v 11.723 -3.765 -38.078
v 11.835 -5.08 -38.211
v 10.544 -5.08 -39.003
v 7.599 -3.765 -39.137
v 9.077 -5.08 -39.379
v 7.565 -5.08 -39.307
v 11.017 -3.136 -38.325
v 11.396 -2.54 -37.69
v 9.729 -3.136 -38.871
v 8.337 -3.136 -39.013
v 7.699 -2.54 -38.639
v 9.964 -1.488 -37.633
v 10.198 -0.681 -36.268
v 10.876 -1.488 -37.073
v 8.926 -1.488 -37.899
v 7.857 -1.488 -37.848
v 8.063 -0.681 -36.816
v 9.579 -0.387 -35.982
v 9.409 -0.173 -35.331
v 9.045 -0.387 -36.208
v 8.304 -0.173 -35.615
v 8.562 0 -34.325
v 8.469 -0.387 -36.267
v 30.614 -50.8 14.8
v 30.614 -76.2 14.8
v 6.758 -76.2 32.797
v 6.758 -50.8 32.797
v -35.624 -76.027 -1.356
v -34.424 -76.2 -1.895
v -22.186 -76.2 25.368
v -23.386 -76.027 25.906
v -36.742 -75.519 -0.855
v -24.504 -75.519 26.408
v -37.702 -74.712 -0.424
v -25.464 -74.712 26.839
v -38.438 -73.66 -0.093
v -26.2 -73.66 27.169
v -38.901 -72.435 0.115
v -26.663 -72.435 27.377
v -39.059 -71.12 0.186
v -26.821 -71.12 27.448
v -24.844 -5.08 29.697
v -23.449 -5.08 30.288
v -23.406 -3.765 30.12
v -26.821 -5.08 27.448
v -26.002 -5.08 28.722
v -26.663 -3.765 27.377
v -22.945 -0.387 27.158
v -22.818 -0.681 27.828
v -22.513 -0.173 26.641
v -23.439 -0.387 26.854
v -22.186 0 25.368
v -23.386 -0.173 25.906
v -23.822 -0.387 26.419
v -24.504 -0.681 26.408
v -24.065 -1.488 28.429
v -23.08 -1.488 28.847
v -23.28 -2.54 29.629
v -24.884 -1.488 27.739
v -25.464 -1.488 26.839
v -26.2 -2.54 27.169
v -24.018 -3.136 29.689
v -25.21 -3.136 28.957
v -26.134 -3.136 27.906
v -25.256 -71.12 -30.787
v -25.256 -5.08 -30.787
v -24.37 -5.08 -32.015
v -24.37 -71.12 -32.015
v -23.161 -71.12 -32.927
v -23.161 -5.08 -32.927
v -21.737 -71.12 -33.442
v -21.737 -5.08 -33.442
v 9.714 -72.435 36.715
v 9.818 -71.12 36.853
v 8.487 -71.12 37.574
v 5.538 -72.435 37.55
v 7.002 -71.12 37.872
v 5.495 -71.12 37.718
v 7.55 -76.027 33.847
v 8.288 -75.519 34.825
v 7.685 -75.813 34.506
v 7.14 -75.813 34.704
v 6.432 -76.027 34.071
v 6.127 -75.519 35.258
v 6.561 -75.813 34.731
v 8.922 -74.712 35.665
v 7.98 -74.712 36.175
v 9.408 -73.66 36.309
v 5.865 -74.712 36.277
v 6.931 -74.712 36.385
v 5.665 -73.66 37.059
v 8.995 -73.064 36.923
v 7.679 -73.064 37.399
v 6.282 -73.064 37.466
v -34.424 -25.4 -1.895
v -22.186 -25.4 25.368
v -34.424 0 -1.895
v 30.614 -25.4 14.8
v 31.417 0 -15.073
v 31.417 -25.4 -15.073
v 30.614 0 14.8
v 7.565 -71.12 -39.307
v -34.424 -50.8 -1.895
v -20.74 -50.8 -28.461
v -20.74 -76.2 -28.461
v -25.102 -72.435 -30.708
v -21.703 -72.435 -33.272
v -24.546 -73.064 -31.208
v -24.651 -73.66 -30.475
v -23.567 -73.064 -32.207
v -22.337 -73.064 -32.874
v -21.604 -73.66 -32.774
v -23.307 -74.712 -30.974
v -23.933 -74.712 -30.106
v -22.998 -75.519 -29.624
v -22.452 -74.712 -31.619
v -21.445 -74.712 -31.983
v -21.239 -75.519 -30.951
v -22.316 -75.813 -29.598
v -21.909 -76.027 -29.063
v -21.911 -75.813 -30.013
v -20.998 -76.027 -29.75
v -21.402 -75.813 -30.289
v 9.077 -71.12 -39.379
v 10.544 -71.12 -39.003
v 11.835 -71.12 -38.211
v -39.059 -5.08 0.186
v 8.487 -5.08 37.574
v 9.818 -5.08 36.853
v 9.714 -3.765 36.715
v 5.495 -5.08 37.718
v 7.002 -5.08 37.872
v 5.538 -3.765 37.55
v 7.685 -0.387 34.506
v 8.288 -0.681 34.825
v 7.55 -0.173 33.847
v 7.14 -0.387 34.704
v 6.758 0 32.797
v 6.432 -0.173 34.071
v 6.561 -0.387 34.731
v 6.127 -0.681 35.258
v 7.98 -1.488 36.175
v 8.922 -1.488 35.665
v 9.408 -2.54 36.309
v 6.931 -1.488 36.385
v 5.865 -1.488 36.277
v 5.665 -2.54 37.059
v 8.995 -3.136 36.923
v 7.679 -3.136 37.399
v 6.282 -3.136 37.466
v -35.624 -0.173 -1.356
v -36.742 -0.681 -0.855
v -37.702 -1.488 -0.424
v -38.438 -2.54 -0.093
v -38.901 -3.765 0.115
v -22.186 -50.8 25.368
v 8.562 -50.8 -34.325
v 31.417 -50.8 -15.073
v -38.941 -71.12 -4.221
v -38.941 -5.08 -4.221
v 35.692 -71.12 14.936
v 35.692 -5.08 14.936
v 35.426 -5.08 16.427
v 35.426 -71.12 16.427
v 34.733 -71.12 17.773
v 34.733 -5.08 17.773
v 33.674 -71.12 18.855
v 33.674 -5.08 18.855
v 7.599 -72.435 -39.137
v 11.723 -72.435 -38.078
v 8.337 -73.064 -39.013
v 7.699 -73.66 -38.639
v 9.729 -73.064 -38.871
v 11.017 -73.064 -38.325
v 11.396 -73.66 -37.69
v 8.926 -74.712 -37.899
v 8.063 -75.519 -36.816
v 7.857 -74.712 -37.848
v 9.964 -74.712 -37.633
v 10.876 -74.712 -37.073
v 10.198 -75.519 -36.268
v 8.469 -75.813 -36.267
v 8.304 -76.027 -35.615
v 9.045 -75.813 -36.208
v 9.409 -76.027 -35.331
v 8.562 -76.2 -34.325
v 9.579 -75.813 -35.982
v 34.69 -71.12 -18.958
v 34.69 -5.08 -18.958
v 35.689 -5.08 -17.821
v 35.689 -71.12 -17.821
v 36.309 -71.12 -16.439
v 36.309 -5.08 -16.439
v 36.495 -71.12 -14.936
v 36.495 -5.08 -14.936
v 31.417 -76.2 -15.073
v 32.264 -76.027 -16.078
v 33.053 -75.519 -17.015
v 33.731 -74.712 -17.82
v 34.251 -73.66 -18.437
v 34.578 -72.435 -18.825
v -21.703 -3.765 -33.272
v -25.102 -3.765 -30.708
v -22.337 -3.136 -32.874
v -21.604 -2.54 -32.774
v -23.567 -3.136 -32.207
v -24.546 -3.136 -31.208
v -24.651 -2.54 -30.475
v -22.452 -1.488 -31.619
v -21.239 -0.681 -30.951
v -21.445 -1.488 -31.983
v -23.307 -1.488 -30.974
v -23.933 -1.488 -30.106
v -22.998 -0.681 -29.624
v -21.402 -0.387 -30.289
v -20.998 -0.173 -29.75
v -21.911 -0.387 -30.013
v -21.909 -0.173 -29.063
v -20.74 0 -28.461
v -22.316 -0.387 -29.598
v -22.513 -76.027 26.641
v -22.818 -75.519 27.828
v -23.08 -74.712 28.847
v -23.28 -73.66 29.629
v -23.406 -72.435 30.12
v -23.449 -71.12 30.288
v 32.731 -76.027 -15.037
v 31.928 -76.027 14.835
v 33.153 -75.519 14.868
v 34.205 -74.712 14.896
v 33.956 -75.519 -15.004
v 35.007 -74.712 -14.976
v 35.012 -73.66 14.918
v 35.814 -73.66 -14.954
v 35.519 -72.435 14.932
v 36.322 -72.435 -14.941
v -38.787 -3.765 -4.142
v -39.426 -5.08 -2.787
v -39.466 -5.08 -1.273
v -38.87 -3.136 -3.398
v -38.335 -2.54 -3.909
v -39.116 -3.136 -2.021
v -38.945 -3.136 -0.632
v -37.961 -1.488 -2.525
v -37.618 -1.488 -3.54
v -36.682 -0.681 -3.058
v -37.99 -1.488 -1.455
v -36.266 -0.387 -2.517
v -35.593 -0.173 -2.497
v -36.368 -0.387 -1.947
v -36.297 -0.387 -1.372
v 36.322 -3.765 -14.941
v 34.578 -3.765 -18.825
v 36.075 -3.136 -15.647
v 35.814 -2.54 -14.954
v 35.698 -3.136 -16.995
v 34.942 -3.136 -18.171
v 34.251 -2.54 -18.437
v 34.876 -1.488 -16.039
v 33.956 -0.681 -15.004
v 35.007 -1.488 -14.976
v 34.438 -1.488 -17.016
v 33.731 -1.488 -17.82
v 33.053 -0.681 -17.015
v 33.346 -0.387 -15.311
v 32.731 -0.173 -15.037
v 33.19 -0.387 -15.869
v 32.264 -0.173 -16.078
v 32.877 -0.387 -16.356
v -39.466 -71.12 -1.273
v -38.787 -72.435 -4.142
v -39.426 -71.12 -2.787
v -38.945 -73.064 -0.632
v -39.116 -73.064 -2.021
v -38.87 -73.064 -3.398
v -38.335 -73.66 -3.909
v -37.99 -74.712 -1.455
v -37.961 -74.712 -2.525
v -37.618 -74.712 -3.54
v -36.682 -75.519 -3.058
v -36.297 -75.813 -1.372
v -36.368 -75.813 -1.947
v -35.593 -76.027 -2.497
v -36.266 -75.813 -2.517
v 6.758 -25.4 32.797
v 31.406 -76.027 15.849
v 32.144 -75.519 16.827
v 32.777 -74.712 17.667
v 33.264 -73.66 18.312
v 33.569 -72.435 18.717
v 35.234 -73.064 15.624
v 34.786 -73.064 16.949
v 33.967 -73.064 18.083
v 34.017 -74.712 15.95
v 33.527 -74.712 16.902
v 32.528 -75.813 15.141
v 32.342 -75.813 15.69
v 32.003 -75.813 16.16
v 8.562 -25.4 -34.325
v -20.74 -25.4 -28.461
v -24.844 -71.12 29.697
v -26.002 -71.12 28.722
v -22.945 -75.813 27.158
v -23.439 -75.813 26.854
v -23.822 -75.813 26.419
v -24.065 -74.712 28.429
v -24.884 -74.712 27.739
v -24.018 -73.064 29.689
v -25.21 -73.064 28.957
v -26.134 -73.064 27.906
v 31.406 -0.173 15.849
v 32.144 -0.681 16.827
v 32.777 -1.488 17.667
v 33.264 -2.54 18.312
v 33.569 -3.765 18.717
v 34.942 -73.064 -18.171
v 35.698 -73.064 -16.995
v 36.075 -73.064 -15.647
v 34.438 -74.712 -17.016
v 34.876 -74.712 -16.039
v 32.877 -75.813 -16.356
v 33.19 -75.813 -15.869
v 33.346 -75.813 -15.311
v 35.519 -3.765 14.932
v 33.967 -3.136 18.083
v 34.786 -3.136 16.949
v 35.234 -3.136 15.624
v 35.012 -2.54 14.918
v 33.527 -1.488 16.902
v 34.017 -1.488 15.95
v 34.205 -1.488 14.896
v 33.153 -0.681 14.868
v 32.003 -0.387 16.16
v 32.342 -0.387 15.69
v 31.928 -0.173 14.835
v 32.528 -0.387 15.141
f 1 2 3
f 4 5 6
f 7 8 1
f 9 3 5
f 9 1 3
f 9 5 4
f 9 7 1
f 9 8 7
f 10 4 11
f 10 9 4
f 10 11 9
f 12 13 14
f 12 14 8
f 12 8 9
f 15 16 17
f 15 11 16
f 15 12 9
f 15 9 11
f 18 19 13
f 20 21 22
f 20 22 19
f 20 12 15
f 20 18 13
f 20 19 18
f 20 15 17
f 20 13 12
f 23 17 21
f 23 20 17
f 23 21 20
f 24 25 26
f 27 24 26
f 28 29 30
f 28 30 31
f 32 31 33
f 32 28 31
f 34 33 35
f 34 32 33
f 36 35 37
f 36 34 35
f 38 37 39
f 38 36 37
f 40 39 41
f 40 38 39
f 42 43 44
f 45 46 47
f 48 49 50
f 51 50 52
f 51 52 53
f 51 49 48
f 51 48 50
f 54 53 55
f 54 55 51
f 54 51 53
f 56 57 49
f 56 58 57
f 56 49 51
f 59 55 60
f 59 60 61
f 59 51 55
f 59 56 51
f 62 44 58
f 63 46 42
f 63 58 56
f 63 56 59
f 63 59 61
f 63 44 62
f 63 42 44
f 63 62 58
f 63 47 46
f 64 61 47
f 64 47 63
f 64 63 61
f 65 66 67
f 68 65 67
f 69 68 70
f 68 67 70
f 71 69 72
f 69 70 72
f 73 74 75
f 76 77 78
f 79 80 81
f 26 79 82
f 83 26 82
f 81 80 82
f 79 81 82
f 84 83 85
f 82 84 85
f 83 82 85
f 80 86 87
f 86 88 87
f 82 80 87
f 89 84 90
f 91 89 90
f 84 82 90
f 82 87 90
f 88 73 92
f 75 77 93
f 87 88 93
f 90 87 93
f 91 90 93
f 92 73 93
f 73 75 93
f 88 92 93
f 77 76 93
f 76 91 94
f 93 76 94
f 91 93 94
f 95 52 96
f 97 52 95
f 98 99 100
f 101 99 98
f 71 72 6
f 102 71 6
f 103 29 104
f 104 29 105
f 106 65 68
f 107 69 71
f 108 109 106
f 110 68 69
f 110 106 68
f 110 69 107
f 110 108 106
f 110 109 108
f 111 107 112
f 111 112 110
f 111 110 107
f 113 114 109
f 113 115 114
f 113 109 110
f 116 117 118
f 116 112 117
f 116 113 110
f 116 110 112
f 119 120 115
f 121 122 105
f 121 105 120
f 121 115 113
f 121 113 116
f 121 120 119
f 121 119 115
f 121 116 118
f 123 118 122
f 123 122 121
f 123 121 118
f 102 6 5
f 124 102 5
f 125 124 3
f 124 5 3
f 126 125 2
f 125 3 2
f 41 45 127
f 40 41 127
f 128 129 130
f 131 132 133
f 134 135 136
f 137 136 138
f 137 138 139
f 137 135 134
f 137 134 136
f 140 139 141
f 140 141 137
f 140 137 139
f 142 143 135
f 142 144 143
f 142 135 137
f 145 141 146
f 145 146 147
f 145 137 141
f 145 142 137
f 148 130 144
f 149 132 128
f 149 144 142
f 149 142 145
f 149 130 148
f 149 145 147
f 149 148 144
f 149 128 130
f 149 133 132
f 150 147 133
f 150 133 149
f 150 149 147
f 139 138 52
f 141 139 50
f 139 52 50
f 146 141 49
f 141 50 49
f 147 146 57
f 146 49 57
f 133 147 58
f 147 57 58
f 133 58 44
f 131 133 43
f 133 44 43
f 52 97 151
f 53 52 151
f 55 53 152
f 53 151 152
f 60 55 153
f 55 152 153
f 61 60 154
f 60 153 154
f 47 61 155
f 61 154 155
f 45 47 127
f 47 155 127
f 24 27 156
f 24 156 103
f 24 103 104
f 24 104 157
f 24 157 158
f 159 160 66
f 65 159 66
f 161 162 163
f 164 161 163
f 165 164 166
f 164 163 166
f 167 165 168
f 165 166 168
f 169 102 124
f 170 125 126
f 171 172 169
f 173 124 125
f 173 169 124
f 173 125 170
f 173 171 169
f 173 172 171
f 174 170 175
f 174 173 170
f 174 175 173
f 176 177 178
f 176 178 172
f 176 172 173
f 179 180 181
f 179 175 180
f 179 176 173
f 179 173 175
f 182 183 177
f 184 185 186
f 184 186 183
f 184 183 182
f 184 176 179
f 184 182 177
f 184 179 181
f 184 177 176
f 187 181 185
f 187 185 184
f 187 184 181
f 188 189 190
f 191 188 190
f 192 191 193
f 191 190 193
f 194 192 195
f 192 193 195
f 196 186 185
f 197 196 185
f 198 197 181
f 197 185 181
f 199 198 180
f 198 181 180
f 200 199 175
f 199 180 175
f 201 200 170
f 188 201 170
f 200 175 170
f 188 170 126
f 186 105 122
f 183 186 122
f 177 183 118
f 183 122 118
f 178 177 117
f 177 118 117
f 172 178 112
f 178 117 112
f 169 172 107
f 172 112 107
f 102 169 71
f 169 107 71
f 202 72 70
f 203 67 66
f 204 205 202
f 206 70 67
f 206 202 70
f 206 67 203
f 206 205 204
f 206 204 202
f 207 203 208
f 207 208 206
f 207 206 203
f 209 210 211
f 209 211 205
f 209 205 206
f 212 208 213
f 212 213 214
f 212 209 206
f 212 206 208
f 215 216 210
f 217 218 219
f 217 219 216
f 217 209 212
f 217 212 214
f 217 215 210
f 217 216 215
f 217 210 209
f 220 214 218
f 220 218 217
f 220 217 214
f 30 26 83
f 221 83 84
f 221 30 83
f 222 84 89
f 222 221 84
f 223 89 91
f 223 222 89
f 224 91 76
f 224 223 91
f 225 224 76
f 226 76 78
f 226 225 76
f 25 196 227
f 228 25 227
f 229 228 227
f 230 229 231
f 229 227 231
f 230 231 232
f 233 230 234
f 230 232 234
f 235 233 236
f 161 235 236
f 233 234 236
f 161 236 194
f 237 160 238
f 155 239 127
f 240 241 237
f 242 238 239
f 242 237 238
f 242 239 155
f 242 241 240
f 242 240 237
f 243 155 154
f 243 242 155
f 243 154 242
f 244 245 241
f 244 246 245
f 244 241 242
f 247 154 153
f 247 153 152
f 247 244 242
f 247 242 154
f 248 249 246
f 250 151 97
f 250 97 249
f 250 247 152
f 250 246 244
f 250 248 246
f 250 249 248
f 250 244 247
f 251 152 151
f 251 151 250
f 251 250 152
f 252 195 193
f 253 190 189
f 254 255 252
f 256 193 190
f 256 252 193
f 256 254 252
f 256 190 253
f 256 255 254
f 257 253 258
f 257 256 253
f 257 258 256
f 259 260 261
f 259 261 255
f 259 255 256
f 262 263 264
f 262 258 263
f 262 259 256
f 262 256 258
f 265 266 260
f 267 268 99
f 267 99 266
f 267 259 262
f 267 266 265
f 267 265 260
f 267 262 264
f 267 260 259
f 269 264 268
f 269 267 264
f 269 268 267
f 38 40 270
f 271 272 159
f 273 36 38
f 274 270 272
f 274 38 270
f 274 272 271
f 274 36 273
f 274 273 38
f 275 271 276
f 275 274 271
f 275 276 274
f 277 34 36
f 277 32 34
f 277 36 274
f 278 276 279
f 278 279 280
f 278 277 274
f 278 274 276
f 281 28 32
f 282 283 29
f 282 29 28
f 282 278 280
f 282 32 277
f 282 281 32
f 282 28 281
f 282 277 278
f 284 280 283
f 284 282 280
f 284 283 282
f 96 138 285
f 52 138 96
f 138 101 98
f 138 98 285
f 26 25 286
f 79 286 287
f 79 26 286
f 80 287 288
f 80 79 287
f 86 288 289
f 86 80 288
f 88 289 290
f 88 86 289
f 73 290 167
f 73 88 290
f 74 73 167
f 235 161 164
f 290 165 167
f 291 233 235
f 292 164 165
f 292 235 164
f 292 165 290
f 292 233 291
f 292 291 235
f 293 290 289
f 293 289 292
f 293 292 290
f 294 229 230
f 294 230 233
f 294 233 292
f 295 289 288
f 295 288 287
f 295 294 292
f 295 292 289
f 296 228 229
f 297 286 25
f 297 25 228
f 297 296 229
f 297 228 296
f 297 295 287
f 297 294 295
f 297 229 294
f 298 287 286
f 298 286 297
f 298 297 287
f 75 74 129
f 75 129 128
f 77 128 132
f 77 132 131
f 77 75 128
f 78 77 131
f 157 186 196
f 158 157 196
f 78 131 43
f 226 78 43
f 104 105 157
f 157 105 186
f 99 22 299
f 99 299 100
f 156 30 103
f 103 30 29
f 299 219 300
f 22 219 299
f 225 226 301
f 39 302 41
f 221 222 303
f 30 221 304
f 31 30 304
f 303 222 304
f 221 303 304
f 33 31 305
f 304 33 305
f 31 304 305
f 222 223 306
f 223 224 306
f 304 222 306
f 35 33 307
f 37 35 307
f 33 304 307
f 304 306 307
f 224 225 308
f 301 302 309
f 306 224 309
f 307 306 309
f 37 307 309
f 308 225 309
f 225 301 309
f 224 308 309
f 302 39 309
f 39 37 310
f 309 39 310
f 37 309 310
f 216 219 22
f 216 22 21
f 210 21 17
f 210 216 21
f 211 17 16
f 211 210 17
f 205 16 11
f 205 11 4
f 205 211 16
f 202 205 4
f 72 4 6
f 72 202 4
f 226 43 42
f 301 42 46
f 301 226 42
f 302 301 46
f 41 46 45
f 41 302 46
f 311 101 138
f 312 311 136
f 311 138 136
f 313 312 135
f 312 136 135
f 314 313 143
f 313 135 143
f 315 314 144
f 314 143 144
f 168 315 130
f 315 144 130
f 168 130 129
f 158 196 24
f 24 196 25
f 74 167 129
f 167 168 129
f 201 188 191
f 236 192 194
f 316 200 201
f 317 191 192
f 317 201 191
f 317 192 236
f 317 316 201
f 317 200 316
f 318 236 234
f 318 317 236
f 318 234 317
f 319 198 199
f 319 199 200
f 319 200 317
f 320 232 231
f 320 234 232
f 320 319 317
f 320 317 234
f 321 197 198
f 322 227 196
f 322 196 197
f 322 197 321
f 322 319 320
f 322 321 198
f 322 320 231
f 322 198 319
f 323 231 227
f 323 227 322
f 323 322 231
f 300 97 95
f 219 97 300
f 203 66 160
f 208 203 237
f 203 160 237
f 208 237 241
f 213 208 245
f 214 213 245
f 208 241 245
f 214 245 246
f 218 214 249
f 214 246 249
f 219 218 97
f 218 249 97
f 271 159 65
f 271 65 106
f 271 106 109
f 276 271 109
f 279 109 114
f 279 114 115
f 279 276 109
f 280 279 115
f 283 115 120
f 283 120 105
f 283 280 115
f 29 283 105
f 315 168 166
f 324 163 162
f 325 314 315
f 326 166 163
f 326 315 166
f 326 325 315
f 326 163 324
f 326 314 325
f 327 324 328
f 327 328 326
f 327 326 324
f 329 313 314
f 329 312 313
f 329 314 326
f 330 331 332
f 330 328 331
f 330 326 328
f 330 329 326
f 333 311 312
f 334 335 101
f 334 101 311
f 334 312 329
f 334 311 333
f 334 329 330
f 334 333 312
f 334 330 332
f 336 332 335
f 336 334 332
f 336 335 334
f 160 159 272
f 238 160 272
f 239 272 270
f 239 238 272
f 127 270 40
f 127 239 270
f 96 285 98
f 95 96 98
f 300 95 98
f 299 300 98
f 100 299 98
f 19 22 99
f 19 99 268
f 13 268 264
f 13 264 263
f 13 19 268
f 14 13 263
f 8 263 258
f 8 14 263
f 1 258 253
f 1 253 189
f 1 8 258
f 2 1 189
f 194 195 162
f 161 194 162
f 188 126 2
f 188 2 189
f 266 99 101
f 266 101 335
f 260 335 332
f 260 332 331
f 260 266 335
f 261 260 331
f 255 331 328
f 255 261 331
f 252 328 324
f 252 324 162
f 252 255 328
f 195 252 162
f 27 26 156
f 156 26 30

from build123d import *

# Parameters (mm, degrees)
F1_DEPTH     = 76.2
F2_F1_R      = 5.08
F2_F2_R      = 5.08
F2_F3_R      = 5.08
F2_F4_R      = 5.08
F3_T1_DEPTH  = 66.04
F3_T3_DEPTH  = 29.883199232
F3_T5_DEPTH  = 29.883199232
F3_T7_DEPTH  = 29.883199232
F3_T9_DEPTH  = 29.883199232
F3_T14_DEPTH = 5.08
F3_T20_DEPTH = 5.08
F3_T26_DEPTH = 5.08
F3_T32_DEPTH = 5.08
F3_T38_DEPTH = 5.08
F3_T44_DEPTH = 5.08
F3_T50_DEPTH = 5.08
F3_T56_DEPTH = 5.08
F3_T62_DEPTH = 5.08
F3_T68_DEPTH = 5.08
F5_DEPTH     = 25.4
F6_DEPTH     = 25.4


# Not quite as in the source:
# - a fillet or chamfer that OpenCascade refuses, or shapes differently, is made with other operations: its cross-section is extruded or revolved along the edge and cut away or added
# - a feature of the source that left no trace in its solid (it failed there, or was rolled back) is left out


with BuildPart() as f1:
    # F0 (on Front) → F1 (new body)
    with BuildSketch(Plane.XZ):
        Polygon((36.5605491077, -17.381725656), (35.6265013603, 17.381725656), (7.8649714404, 38.3261150914), (-25.8190423903, 29.6798902177), (-40.0607906887, -2.0461652844), (-24.1359465072, -32.9616845282), (9.9637576777, -39.7866509615), align=None)
    extrude(amount=F1_DEPTH)

    # F2: fillet of radius 5.08 on 4 edges, made by hand

    # F2_f1
    f2_f1_edges = [f1.edges().sort_by_distance(p)[0] for p in [
        (7.8649714404, -38.1, 38.3261150914),
    ]]
    fillet(f2_f1_edges, radius=F2_F1_R)

    # F2_f2
    f2_f2_edges = [f1.edges().sort_by_distance(p)[0] for p in [
        (-25.8190423903, -38.1, 29.6798902177),
    ]]
    fillet(f2_f2_edges, radius=F2_F2_R)

    # F2_f3
    f2_f3_edges = [f1.edges().sort_by_distance(p)[0] for p in [
        (-8.9770354749, 0, 34.0030026545),
    ]]
    fillet(f2_f3_edges, radius=F2_F3_R)

    # F2_f4
    f2_f4_edges = [f1.edges().sort_by_distance(p)[0] for p in [
        (-8.9770354749, -76.2, 34.0030026545),
    ]]
    fillet(f2_f4_edges, radius=F2_F4_R)

    # F3: fillet of radius 5.08 on 19 edges, made by hand

    # F3_s2 → F3_t1 (cut)
    with BuildSketch(Plane.XZ.offset(5.08)):
        with BuildLine():
            ThreePointArc((35.6922091389, 14.9362091735), (35.1301118192, 17.1260312252), (33.6735514536, 18.8551078331))
            Line((33.6735514536, 18.8551078331), (35.6265013603, 17.381725656))
            Line((35.6265013603, 17.381725656), (35.6922091389, 14.9362091735))
        make_face()
        with BuildLine():
            ThreePointArc((34.6895354607, -18.957852653), (36.0511453352, -17.1530555552), (36.4948413291, -14.9362091735))
            Line((36.4948413291, -14.9362091735), (36.5605491077, -17.381725656))
            Line((36.5605491077, -17.381725656), (34.6895354607, -18.957852653))
        make_face()
        with BuildLine():
            ThreePointArc((7.564934043, -39.3065326972), (9.8249311044, -39.245809579), (11.8347713247, -38.2105239645))
            Line((11.8347713247, -38.2105239645), (9.9637576777, -39.7866509615))
            Line((9.9637576777, -39.7866509615), (7.564934043, -39.3065326972))
        make_face()
        with BuildLine():
            ThreePointArc((-25.2562170056, -30.7868598483), (-23.79965664, -32.5159364562), (-21.7371228725, -33.4418027925))
            Line((-21.7371228725, -33.4418027925), (-24.1359465072, -32.9616845282))
            Line((-24.1359465072, -32.9616845282), (-25.2562170056, -30.7868598483))
        make_face()
        with BuildLine():
            ThreePointArc((-38.9405201903, -4.2209899644), (-39.50261751, -2.0311679128), (-39.0589215161, 0.1856784689))
            Line((-39.0589215161, 0.1856784689), (-40.0607906887, -2.0461652844))
            Line((-40.0607906887, -2.0461652844), (-38.9405201903, -4.2209899644))
        make_face()
    extrude(amount=F3_T1_DEPTH, mode=Mode.SUBTRACT)

    # F3_s4 → F3_t3 (cut)
    with BuildSketch(Plane(origin=(0.4273541338, 0, -15.9052946325), x_dir=(0, 1, 0), z_dir=(-0.026858978, 0, 0.9996392326))):
        with BuildLine():
            ThreePointArc((-76.2, -31.0005038658), (-74.7121024484, -34.5926063143), (-71.12, -36.0805038658))
            Line((-71.12, -36.0805038658), (-76.2, -36.0805038658))
            Line((-76.2, -36.0805038658), (-76.2, -31.0005038658))
        make_face()
        with BuildLine():
            ThreePointArc((0, -31.0005038658), (-1.4878975516, -34.5926063143), (-5.08, -36.0805038658))
            Line((-5.08, -36.0805038658), (0, -36.0805038658))
            Line((0, -36.0805038658), (0, -31.0005038658))
        make_face()
    extrude(amount=F3_T3_DEPTH, mode=Mode.SUBTRACT)

    # F3_s6 → F3_t5 (cut)
    with BuildSketch(Plane(origin=(-11.9052292748, 0, -10.0288703376), x_dir=(0, 1, 0), z_dir=(0.7648031243, 0, 0.6442640616))):
        with BuildLine():
            ThreePointArc((0, -31.7682459503), (-1.4878975516, -35.3603483987), (-5.08, -36.8482459503))
            Line((-5.08, -36.8482459503), (0, -36.8482459503))
            Line((0, -36.8482459503), (0, -31.7682459503))
        make_face()
        with BuildLine():
            ThreePointArc((-76.2, -31.7682459503), (-74.7121024484, -35.3603483987), (-71.12, -36.8482459503))
            Line((-71.12, -36.8482459503), (-76.2, -36.8482459503))
            Line((-76.2, -36.8482459503), (-76.2, -31.7682459503))
        make_face()
    extrude(amount=F3_T5_DEPTH, mode=Mode.SUBTRACT)

    # F3_s8 → F3_t7 (cut)
    with BuildSketch(Plane(origin=(-14.4644044829, 0, 2.8950126528), x_dir=(0, 1, 0), z_dir=(0.9805528748, 0, -0.1962550883))):
        with BuildLine():
            ThreePointArc((0, -31.9774768364), (-1.4878975516, -35.5695792849), (-5.08, -37.0574768364))
            Line((-5.08, -37.0574768364), (0, -37.0574768364))
            Line((0, -37.0574768364), (0, -31.9774768364))
        make_face()
        with BuildLine():
            ThreePointArc((-76.2, -31.9774768364), (-74.7121024484, -35.5695792849), (-71.12, -37.0574768364))
            Line((-71.12, -37.0574768364), (-76.2, -37.0574768364))
            Line((-76.2, -37.0574768364), (-76.2, -31.9774768364))
        make_face()
    extrude(amount=F3_T7_DEPTH, mode=Mode.SUBTRACT)

    # F3_s10 → F3_t9 (cut)
    with BuildSketch(Plane(origin=(-6.4473598679, 0, 12.5165104158), x_dir=(0, 1, 0), z_dir=(0.457926311, 0, -0.8889901539))):
        with BuildLine():
            ThreePointArc((-71.12, -36.5506413995), (-74.7121024484, -35.0627438479), (-76.2, -31.4706413995))
            Line((-76.2, -31.4706413995), (-76.2, -36.5506413995))
            Line((-76.2, -36.5506413995), (-71.12, -36.5506413995))
        make_face()
        with BuildLine():
            ThreePointArc((-5.08, -36.5506413995), (-1.4878975516, -35.0627438479), (0, -31.4706413995))
            Line((0, -31.4706413995), (0, -36.5506413995))
            Line((0, -36.5506413995), (-5.08, -36.5506413995))
        make_face()
    extrude(amount=F3_T9_DEPTH, mode=Mode.SUBTRACT)


with BuildPart() as f3_tool12:
    # F3_s13 → F3_t14 (new body)
    with BuildSketch(Plane.XZ.offset(71.12)):
        Polygon((30.6140418374, 14.7997655654), (35.6922091389, 14.9362091735), (35.6265013603, 17.381725656), (33.6735514536, 18.8551078331), align=None)
    extrude(amount=F3_T14_DEPTH)

    # F3_s15 → F3_t16 (revolve, cut)
    with BuildSketch(Plane(origin=(30.6140418374, -71.12, 14.7997655654), x_dir=(-0.8889901539, 0, -0.457926311), z_dir=(-0.457926311, 0, 0.8889901539))):
        with BuildLine():
            ThreePointArc((0, -5.08), (5.08, 0), (0, 5.08))
            Line((0, 5.08), (0, -5.08))
        make_face()
    revolve(axis=Axis((30.6140418374, -71.12, 14.7997655654), (0, -1, 0)), mode=Mode.SUBTRACT)


with BuildPart() as f1_1:
    add(f1.part)

    # F3_t11: cut F3_tool12
    add(f3_tool12.part, mode=Mode.SUBTRACT)


with BuildPart() as f3_tool18:
    # F3_s19 → F3_t20 (new body)
    with BuildSketch(Plane.XZ.offset(5.08)):
        Polygon((30.6140418374, 14.7997655654), (35.6922091389, 14.9362091735), (35.6265013603, 17.381725656), (33.6735514536, 18.8551078331), align=None)
    extrude(amount=-F3_T20_DEPTH)

    # F3_s21 → F3_t22 (revolve, cut)
    with BuildSketch(Plane(origin=(30.6140418374, -5.08, 14.7997655654), x_dir=(-0.8889901539, 0, -0.457926311), z_dir=(0.457926311, 0, -0.8889901539))):
        with BuildLine():
            ThreePointArc((0, -5.08), (5.08, 0), (0, 5.08))
            Line((0, 5.08), (0, -5.08))
        make_face()
    revolve(axis=Axis((30.6140418374, -5.08, 14.7997655654), (0, 1, 0)), mode=Mode.SUBTRACT)


with BuildPart() as f1_2:
    add(f1_1.part)

    # F3_t17: cut F3_tool18
    add(f3_tool18.part, mode=Mode.SUBTRACT)


with BuildPart() as f3_tool24:
    # F3_s25 → F3_t26 (new body)
    with BuildSketch(Plane.XZ.offset(5.08)):
        Polygon((-34.4244502085, -1.8947243046), (-38.9405201903, -4.2209899644), (-40.0607906887, -2.0461652844), (-39.0589215161, 0.1856784689), align=None)
    extrude(amount=-F3_T26_DEPTH)

    # F3_s27 → F3_t28 (revolve, cut)
    with BuildSketch(Plane(origin=(-34.4244502085, -5.08, -1.8947243046), x_dir=(0.9996392326, 0, 0.026858978), z_dir=(-0.026858978, 0, 0.9996392326))):
        with BuildLine():
            ThreePointArc((0, -5.08), (5.08, 0), (0, 5.08))
            Line((0, 5.08), (0, -5.08))
        make_face()
    revolve(axis=Axis((-34.4244502085, -5.08, -1.8947243046), (0, 1, 0)), mode=Mode.SUBTRACT)


with BuildPart() as f1_3:
    add(f1_2.part)

    # F3_t23: cut F3_tool24
    add(f3_tool24.part, mode=Mode.SUBTRACT)


with BuildPart() as f3_tool30:
    # F3_s31 → F3_t32 (new body)
    with BuildSketch(Plane.XZ.offset(71.12)):
        Polygon((-34.4244502085, -1.8947243046), (-38.9405201903, -4.2209899644), (-40.0607906887, -2.0461652844), (-39.0589215161, 0.1856784689), align=None)
    extrude(amount=F3_T32_DEPTH)

    # F3_s33 → F3_t34 (revolve, cut)
    with BuildSketch(Plane(origin=(-34.4244502085, -71.12, -1.8947243046), x_dir=(0.9996392326, 0, 0.026858978), z_dir=(0.026858978, 0, -0.9996392326))):
        with BuildLine():
            ThreePointArc((0, -5.08), (5.08, 0), (0, 5.08))
            Line((0, 5.08), (0, -5.08))
        make_face()
    revolve(axis=Axis((-34.4244502085, -71.12, -1.8947243046), (0, -1, 0)), mode=Mode.SUBTRACT)


with BuildPart() as f1_4:
    add(f1_3.part)

    # F3_t29: cut F3_tool30
    add(f3_tool30.part, mode=Mode.SUBTRACT)


with BuildPart() as f3_tool36:
    # F3_s37 → F3_t38 (new body)
    with BuildSketch(Plane.XZ.offset(71.12)):
        Polygon((31.4166740277, -15.0726527817), (36.4948413291, -14.9362091735), (36.5605491077, -17.381725656), (34.6895354607, -18.957852653), align=None)
    extrude(amount=F3_T38_DEPTH)

    # F3_s39 → F3_t40 (revolve, cut)
    with BuildSketch(Plane(origin=(31.4166740277, -71.12, -15.0726527817), x_dir=(-0.9122975015, 0, 0.409528105), z_dir=(0.409528105, 0, 0.9122975015))):
        with BuildLine():
            ThreePointArc((0, -5.08), (5.08, 0), (0, 5.08))
            Line((0, 5.08), (0, -5.08))
        make_face()
    revolve(axis=Axis((31.4166740277, -71.12, -15.0726527817), (0, -1, 0)), mode=Mode.SUBTRACT)


with BuildPart() as f1_5:
    add(f1_4.part)

    # F3_t35: cut F3_tool36
    add(f3_tool36.part, mode=Mode.SUBTRACT)


with BuildPart() as f3_tool42:
    # F3_s43 → F3_t44 (new body)
    with BuildSketch(Plane.XZ.offset(5.08)):
        Polygon((31.4166740277, -15.0726527817), (36.4948413291, -14.9362091735), (36.5605491077, -17.381725656), (34.6895354607, -18.957852653), align=None)
    extrude(amount=-F3_T44_DEPTH)

    # F3_s45 → F3_t46 (revolve, cut)
    with BuildSketch(Plane(origin=(31.4166740277, -5.08, -15.0726527817), x_dir=(-0.9122975015, 0, 0.409528105), z_dir=(-0.409528105, 0, -0.9122975015))):
        with BuildLine():
            ThreePointArc((0, -5.08), (5.08, 0), (0, 5.08))
            Line((0, 5.08), (0, -5.08))
        make_face()
    revolve(axis=Axis((31.4166740277, -5.08, -15.0726527817), (0, 1, 0)), mode=Mode.SUBTRACT)


with BuildPart() as f1_6:
    add(f1_5.part)

    # F3_t41: cut F3_tool42
    add(f3_tool42.part, mode=Mode.SUBTRACT)


with BuildPart() as f3_tool48:
    # F3_s49 → F3_t50 (new body)
    with BuildSketch(Plane.XZ.offset(5.08)):
        Polygon((8.5619098917, -34.3253240931), (7.564934043, -39.3065326972), (9.9637576777, -39.7866509615), (11.8347713247, -38.2105239645), align=None)
    extrude(amount=-F3_T50_DEPTH)

    # F3_s51 → F3_t52 (revolve, cut)
    with BuildSketch(Plane(origin=(8.5619098917, -5.08, -34.3253240931), x_dir=(-0.248626223, 0, 0.9685995051), z_dir=(-0.9685995051, 0, -0.248626223))):
        with BuildLine():
            ThreePointArc((0, -5.08), (5.08, 0), (0, 5.08))
            Line((0, 5.08), (0, -5.08))
        make_face()
    revolve(axis=Axis((8.5619098917, -5.08, -34.3253240931), (0, 1, 0)), mode=Mode.SUBTRACT)


with BuildPart() as f1_7:
    add(f1_6.part)

    # F3_t47: cut F3_tool48
    add(f3_tool48.part, mode=Mode.SUBTRACT)


with BuildPart() as f3_tool54:
    # F3_s55 → F3_t56 (new body)
    with BuildSketch(Plane.XZ.offset(71.12)):
        Polygon((8.5619098917, -34.3253240931), (7.564934043, -39.3065326972), (9.9637576777, -39.7866509615), (11.8347713247, -38.2105239645), align=None)
    extrude(amount=F3_T56_DEPTH)

    # F3_s57 → F3_t58 (revolve, cut)
    with BuildSketch(Plane(origin=(8.5619098917, -71.12, -34.3253240931), x_dir=(-0.248626223, 0, 0.9685995051), z_dir=(0.9685995051, 0, 0.248626223))):
        with BuildLine():
            ThreePointArc((0, -5.08), (5.08, 0), (0, 5.08))
            Line((0, 5.08), (0, -5.08))
        make_face()
    revolve(axis=Axis((8.5619098917, -71.12, -34.3253240931), (0, -1, 0)), mode=Mode.SUBTRACT)


with BuildPart() as f1_8:
    add(f1_7.part)

    # F3_t53: cut F3_tool54
    add(f3_tool54.part, mode=Mode.SUBTRACT)


with BuildPart() as f3_tool60:
    # F3_s61 → F3_t62 (new body)
    with BuildSketch(Plane.XZ.offset(5.08)):
        Polygon((-20.7401470239, -28.4605941885), (-21.7371228725, -33.4418027925), (-24.1359465072, -32.9616845282), (-25.2562170056, -30.7868598483), align=None)
    extrude(amount=-F3_T62_DEPTH)

    # F3_s63 → F3_t64 (revolve, cut)
    with BuildSketch(Plane(origin=(-20.7401470239, -5.08, -28.4605941885), x_dir=(0.6022656725, 0, 0.798295722), z_dir=(-0.798295722, 0, 0.6022656725))):
        with BuildLine():
            ThreePointArc((0, -5.08), (5.08, 0), (0, 5.08))
            Line((0, 5.08), (0, -5.08))
        make_face()
    revolve(axis=Axis((-20.7401470239, -5.08, -28.4605941885), (0, 1, 0)), mode=Mode.SUBTRACT)


with BuildPart() as f1_9:
    add(f1_8.part)

    # F3_t59: cut F3_tool60
    add(f3_tool60.part, mode=Mode.SUBTRACT)


with BuildPart() as f3_tool66:
    # F3_s67 → F3_t68 (new body)
    with BuildSketch(Plane.XZ.offset(71.12)):
        Polygon((-20.7401470239, -28.4605941885), (-21.7371228725, -33.4418027925), (-24.1359465072, -32.9616845282), (-25.2562170056, -30.7868598483), align=None)
    extrude(amount=F3_T68_DEPTH)

    # F3_s69 → F3_t70 (revolve, cut)
    with BuildSketch(Plane(origin=(-20.7401470239, -71.12, -28.4605941885), x_dir=(0.6022656725, 0, 0.798295722), z_dir=(0.798295722, 0, -0.6022656725))):
        with BuildLine():
            ThreePointArc((0, -5.08), (5.08, 0), (0, 5.08))
            Line((0, 5.08), (0, -5.08))
        make_face()
    revolve(axis=Axis((-20.7401470239, -71.12, -28.4605941885), (0, -1, 0)), mode=Mode.SUBTRACT)


with BuildPart() as f1_10:
    add(f1_9.part)

    # F3_t65: cut F3_tool66
    add(f3_tool66.part, mode=Mode.SUBTRACT)

    # F5 (cut): a face of the model
    f5_faces = [f1_10.faces().sort_by_distance(p)[0] for p in [
        (0, -76.2, -0.9697850665),
    ]]
    extrude(f5_faces, amount=-F5_DEPTH, mode=Mode.SUBTRACT)

    # F6 (cut): a face of the model
    f6_faces = [f1_10.faces().sort_by_distance(p)[0] for p in [
        (0, 0, -0.9697850665),
    ]]
    extrude(f6_faces, amount=-F6_DEPTH, mode=Mode.SUBTRACT)


solid = f1_10.part
